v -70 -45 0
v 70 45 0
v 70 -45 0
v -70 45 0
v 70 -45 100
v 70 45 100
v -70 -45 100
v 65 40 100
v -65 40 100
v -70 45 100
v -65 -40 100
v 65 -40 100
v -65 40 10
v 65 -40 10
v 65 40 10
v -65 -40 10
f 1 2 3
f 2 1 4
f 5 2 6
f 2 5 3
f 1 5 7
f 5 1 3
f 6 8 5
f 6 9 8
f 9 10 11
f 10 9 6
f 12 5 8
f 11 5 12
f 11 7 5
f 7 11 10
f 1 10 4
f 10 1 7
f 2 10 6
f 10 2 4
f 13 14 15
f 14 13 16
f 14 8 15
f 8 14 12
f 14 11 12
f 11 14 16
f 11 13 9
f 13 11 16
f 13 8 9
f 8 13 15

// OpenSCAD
union()
{
    difference()
    {
        linear_extrude(height = 100.0, twist = 0.0, scale = 1.0, slices = 1, center = false)
        {
            scale([140.0, 90.0])
            {
                M8();
            }
        }
        translate([0.0, 0.0, 10.0])
        {
            linear_extrude(height = 100.0, twist = 0.0, scale = 1.0, slices = 1, center = false)
            {
                scale([130.0, 80.0])
                {
                    M8();
                }
            }
        }
    }
}

module M8()
{
    polygon
    (
        points =
        [
            [-0.5, -0.5], 
            [0.5, -0.5], 
            [0.5, 0.5], 
            [-0.5, 0.5]
        ],
        paths =
        [
            [0, 1, 2, 3]
        ]
    );
}
